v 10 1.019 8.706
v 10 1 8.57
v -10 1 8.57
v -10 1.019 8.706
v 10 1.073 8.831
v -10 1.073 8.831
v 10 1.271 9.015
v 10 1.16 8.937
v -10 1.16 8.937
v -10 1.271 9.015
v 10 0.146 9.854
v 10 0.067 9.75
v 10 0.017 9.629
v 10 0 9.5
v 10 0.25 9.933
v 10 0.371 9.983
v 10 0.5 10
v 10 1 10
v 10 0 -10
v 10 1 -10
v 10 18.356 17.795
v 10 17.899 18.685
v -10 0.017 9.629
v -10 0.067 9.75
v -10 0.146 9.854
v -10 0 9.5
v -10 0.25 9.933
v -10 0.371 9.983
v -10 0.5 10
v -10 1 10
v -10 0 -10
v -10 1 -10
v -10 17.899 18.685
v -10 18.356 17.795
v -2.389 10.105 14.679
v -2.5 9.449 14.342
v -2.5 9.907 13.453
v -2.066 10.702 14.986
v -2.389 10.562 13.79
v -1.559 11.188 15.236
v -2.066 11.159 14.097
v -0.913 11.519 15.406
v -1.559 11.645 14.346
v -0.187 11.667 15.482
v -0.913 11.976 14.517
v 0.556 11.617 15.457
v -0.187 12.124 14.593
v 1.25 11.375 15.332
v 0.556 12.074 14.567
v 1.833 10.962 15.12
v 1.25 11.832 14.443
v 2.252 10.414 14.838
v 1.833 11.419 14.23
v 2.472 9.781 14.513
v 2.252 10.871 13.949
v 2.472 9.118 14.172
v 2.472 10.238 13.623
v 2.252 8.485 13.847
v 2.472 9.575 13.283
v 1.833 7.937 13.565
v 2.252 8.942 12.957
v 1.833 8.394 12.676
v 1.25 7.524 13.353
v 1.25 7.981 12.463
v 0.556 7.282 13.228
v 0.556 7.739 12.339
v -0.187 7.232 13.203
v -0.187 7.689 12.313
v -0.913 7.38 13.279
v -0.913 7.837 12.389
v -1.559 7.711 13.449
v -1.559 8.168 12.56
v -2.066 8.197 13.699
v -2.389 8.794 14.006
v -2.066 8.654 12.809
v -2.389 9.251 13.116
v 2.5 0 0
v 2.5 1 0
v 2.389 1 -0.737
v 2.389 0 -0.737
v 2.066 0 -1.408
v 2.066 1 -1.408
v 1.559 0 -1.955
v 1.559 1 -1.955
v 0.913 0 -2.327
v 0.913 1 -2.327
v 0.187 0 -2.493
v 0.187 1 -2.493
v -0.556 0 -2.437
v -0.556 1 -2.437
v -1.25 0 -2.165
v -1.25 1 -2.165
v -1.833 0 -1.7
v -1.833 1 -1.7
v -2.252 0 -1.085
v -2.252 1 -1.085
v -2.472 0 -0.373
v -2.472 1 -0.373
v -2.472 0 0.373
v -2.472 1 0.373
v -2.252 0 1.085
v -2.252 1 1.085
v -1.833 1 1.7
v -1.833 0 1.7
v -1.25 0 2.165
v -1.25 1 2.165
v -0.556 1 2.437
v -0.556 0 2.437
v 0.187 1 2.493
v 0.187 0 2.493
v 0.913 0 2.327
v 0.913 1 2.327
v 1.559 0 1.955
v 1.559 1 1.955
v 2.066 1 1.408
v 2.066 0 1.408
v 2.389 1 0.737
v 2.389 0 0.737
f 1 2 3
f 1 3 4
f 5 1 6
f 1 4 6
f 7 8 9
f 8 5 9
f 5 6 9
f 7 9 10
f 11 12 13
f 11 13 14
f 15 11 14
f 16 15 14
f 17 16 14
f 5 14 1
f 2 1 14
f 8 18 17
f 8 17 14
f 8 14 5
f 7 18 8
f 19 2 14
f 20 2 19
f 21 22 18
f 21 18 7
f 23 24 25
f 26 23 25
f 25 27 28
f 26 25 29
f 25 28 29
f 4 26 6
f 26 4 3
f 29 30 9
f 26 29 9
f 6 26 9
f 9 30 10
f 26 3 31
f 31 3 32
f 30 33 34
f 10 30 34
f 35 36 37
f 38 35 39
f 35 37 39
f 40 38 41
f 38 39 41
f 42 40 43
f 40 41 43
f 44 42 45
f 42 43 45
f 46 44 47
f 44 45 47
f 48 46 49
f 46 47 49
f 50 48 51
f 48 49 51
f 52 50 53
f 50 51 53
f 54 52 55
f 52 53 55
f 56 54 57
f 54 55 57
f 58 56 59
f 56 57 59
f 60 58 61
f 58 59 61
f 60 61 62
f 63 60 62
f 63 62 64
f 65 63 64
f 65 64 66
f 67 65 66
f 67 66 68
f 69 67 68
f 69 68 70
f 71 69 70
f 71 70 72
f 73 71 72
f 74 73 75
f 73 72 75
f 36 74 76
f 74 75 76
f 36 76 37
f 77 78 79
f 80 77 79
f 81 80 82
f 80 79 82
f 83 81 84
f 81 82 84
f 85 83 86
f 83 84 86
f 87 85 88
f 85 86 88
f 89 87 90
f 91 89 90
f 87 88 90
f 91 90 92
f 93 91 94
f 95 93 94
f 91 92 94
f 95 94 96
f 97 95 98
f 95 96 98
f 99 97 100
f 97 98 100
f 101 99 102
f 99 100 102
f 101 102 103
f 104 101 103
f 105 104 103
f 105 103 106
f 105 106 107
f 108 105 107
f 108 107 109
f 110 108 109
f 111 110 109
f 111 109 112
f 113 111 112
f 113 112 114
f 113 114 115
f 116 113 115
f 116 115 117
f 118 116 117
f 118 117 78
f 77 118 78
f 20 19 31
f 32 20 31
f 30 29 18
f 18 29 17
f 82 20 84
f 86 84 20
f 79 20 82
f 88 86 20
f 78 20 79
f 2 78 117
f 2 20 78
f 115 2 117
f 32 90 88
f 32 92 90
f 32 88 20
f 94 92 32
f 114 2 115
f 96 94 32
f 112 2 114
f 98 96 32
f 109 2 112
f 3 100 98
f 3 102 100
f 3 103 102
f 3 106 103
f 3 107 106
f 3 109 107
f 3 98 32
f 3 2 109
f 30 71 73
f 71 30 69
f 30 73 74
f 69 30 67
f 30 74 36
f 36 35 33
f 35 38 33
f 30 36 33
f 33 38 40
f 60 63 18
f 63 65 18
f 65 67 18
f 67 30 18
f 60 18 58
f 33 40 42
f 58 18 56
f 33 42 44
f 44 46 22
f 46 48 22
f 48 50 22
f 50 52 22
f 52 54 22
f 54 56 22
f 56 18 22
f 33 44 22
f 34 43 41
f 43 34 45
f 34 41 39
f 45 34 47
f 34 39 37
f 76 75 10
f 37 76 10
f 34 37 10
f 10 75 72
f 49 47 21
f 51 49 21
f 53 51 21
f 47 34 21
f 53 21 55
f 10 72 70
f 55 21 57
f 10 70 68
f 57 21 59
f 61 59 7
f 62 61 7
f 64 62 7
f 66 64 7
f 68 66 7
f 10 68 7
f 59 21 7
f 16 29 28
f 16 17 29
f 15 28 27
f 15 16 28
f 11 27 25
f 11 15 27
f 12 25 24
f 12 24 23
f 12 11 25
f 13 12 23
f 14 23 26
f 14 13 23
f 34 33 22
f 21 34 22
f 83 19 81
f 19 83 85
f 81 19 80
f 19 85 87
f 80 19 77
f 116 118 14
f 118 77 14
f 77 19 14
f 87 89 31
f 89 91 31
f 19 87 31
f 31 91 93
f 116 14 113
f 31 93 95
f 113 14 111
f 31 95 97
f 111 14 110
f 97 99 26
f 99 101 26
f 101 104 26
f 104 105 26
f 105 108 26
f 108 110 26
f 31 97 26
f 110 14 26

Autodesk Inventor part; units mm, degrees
ref_plane "YZ Plane" through (0, 0, 0) normal (1, 0, 0) x (0, 1, 0)
ref_plane "XZ Plane" through (0, 0, 0) normal (0, 1, 0) x (-1, 0, 0)
sketch "Sketch1" plane through (0, 0, 0) normal (0, 1, 0) x (-1, 0, 0)
  line L0 (-10, -10) -> (10, -10)
  line L1 (10, -10) -> (10, 10)
  line L2 (10, 10) -> (-10, 10)
  line L3 (-10, 10) -> (-10, -10)
  line L4 (-10, -10) -> (10, 10) construction
  line L5 (10, -10) -> (-10, 10) construction
  point P0 (0, 0)
  dimension "d0" = 20
  dimension "d1" = 20
extrude "Extrusion1" add sketch "Sketch1" along normal blind 1
sketch "Sketch3" plane through (10, 0, 10) normal (1, 0, 0) x (0, 0, -1)
  line L0 (20, 1) -> (0, 1) projected
  line L1 (0, 1) -> (-0.9142, 2.7788)
  line L2 (0, 1) -> (2, 1) construction
  point P0 (10, 0)
  dimension "d5" = 2
  dimension "d6" = 117.2
ref_plane "Work Plane1" through (10, 1, 10) normal (0, 0.4570979, -0.8894164) x (0, 0.8894164, 0.4570979)
sketch "Sketch4" plane through (10, 1, 10) normal (0, 0.4570979, -0.8894164) x (0, 0.8894164, 0.4570979)
  line L0 (-9.142, -20) -> (0, -20) projected
  line L1 (0, -20) -> (19, -20)
  line L2 (19, -20) -> (19, 0)
  line L3 (19, 0) -> (0, 0)
  line L4 (0, 0) -> (0, -20)
  point P0 (-5.4604, -10)
  dimension "d7" = 19
  dimension "d8" = 20
extrude "Extrusion2" add sketch "Sketch4" along normal blind 1
sketch "Sketch5" plane through (10, 1, 10) normal (1, 0, 0) x (0, 0.4570979, -0.8894164)
  line L0 (0, 0) -> (1, 0) projected
  line L1 (1, 0) -> (1, -0.5139)
  line L2 (17.7883, -9.142) -> (0, 0) projected
  line L3 (1, 0) -> (0, 0)
  line L4 (0, 0) -> (1, -0.5139)
  point P0 (8.4371, -5.4604)
extrude "Extrusion3" add sketch "Sketch5" against normal blind 20
fillet "Fillet1" radius 0.5 2 edges at (0, 1, 8.8757) (0, 0, 10)
sketch "Sketch6" plane through (0, 1, 0) normal (0, 1, 0) x (1, 0, 0)
  circle A0 centre (0, 0) radius 2.5
  dimension "d14" = 5
sketch "Sketch7" plane through (10, 1.4571, 9.1106) normal (0, 0.4570979, -0.8894164) x (-1, 0, 0)
  circle A0 centre (10, 9.5) radius 2.5
  point P0 (10, -5.4604)
  dimension "d15" = 5
extrude "Extrusion4" cut sketch "Sketch6" against normal blind 10
extrude "Extrusion5" cut sketch "Sketch7" against normal blind 10
properties part number "trail 17"
